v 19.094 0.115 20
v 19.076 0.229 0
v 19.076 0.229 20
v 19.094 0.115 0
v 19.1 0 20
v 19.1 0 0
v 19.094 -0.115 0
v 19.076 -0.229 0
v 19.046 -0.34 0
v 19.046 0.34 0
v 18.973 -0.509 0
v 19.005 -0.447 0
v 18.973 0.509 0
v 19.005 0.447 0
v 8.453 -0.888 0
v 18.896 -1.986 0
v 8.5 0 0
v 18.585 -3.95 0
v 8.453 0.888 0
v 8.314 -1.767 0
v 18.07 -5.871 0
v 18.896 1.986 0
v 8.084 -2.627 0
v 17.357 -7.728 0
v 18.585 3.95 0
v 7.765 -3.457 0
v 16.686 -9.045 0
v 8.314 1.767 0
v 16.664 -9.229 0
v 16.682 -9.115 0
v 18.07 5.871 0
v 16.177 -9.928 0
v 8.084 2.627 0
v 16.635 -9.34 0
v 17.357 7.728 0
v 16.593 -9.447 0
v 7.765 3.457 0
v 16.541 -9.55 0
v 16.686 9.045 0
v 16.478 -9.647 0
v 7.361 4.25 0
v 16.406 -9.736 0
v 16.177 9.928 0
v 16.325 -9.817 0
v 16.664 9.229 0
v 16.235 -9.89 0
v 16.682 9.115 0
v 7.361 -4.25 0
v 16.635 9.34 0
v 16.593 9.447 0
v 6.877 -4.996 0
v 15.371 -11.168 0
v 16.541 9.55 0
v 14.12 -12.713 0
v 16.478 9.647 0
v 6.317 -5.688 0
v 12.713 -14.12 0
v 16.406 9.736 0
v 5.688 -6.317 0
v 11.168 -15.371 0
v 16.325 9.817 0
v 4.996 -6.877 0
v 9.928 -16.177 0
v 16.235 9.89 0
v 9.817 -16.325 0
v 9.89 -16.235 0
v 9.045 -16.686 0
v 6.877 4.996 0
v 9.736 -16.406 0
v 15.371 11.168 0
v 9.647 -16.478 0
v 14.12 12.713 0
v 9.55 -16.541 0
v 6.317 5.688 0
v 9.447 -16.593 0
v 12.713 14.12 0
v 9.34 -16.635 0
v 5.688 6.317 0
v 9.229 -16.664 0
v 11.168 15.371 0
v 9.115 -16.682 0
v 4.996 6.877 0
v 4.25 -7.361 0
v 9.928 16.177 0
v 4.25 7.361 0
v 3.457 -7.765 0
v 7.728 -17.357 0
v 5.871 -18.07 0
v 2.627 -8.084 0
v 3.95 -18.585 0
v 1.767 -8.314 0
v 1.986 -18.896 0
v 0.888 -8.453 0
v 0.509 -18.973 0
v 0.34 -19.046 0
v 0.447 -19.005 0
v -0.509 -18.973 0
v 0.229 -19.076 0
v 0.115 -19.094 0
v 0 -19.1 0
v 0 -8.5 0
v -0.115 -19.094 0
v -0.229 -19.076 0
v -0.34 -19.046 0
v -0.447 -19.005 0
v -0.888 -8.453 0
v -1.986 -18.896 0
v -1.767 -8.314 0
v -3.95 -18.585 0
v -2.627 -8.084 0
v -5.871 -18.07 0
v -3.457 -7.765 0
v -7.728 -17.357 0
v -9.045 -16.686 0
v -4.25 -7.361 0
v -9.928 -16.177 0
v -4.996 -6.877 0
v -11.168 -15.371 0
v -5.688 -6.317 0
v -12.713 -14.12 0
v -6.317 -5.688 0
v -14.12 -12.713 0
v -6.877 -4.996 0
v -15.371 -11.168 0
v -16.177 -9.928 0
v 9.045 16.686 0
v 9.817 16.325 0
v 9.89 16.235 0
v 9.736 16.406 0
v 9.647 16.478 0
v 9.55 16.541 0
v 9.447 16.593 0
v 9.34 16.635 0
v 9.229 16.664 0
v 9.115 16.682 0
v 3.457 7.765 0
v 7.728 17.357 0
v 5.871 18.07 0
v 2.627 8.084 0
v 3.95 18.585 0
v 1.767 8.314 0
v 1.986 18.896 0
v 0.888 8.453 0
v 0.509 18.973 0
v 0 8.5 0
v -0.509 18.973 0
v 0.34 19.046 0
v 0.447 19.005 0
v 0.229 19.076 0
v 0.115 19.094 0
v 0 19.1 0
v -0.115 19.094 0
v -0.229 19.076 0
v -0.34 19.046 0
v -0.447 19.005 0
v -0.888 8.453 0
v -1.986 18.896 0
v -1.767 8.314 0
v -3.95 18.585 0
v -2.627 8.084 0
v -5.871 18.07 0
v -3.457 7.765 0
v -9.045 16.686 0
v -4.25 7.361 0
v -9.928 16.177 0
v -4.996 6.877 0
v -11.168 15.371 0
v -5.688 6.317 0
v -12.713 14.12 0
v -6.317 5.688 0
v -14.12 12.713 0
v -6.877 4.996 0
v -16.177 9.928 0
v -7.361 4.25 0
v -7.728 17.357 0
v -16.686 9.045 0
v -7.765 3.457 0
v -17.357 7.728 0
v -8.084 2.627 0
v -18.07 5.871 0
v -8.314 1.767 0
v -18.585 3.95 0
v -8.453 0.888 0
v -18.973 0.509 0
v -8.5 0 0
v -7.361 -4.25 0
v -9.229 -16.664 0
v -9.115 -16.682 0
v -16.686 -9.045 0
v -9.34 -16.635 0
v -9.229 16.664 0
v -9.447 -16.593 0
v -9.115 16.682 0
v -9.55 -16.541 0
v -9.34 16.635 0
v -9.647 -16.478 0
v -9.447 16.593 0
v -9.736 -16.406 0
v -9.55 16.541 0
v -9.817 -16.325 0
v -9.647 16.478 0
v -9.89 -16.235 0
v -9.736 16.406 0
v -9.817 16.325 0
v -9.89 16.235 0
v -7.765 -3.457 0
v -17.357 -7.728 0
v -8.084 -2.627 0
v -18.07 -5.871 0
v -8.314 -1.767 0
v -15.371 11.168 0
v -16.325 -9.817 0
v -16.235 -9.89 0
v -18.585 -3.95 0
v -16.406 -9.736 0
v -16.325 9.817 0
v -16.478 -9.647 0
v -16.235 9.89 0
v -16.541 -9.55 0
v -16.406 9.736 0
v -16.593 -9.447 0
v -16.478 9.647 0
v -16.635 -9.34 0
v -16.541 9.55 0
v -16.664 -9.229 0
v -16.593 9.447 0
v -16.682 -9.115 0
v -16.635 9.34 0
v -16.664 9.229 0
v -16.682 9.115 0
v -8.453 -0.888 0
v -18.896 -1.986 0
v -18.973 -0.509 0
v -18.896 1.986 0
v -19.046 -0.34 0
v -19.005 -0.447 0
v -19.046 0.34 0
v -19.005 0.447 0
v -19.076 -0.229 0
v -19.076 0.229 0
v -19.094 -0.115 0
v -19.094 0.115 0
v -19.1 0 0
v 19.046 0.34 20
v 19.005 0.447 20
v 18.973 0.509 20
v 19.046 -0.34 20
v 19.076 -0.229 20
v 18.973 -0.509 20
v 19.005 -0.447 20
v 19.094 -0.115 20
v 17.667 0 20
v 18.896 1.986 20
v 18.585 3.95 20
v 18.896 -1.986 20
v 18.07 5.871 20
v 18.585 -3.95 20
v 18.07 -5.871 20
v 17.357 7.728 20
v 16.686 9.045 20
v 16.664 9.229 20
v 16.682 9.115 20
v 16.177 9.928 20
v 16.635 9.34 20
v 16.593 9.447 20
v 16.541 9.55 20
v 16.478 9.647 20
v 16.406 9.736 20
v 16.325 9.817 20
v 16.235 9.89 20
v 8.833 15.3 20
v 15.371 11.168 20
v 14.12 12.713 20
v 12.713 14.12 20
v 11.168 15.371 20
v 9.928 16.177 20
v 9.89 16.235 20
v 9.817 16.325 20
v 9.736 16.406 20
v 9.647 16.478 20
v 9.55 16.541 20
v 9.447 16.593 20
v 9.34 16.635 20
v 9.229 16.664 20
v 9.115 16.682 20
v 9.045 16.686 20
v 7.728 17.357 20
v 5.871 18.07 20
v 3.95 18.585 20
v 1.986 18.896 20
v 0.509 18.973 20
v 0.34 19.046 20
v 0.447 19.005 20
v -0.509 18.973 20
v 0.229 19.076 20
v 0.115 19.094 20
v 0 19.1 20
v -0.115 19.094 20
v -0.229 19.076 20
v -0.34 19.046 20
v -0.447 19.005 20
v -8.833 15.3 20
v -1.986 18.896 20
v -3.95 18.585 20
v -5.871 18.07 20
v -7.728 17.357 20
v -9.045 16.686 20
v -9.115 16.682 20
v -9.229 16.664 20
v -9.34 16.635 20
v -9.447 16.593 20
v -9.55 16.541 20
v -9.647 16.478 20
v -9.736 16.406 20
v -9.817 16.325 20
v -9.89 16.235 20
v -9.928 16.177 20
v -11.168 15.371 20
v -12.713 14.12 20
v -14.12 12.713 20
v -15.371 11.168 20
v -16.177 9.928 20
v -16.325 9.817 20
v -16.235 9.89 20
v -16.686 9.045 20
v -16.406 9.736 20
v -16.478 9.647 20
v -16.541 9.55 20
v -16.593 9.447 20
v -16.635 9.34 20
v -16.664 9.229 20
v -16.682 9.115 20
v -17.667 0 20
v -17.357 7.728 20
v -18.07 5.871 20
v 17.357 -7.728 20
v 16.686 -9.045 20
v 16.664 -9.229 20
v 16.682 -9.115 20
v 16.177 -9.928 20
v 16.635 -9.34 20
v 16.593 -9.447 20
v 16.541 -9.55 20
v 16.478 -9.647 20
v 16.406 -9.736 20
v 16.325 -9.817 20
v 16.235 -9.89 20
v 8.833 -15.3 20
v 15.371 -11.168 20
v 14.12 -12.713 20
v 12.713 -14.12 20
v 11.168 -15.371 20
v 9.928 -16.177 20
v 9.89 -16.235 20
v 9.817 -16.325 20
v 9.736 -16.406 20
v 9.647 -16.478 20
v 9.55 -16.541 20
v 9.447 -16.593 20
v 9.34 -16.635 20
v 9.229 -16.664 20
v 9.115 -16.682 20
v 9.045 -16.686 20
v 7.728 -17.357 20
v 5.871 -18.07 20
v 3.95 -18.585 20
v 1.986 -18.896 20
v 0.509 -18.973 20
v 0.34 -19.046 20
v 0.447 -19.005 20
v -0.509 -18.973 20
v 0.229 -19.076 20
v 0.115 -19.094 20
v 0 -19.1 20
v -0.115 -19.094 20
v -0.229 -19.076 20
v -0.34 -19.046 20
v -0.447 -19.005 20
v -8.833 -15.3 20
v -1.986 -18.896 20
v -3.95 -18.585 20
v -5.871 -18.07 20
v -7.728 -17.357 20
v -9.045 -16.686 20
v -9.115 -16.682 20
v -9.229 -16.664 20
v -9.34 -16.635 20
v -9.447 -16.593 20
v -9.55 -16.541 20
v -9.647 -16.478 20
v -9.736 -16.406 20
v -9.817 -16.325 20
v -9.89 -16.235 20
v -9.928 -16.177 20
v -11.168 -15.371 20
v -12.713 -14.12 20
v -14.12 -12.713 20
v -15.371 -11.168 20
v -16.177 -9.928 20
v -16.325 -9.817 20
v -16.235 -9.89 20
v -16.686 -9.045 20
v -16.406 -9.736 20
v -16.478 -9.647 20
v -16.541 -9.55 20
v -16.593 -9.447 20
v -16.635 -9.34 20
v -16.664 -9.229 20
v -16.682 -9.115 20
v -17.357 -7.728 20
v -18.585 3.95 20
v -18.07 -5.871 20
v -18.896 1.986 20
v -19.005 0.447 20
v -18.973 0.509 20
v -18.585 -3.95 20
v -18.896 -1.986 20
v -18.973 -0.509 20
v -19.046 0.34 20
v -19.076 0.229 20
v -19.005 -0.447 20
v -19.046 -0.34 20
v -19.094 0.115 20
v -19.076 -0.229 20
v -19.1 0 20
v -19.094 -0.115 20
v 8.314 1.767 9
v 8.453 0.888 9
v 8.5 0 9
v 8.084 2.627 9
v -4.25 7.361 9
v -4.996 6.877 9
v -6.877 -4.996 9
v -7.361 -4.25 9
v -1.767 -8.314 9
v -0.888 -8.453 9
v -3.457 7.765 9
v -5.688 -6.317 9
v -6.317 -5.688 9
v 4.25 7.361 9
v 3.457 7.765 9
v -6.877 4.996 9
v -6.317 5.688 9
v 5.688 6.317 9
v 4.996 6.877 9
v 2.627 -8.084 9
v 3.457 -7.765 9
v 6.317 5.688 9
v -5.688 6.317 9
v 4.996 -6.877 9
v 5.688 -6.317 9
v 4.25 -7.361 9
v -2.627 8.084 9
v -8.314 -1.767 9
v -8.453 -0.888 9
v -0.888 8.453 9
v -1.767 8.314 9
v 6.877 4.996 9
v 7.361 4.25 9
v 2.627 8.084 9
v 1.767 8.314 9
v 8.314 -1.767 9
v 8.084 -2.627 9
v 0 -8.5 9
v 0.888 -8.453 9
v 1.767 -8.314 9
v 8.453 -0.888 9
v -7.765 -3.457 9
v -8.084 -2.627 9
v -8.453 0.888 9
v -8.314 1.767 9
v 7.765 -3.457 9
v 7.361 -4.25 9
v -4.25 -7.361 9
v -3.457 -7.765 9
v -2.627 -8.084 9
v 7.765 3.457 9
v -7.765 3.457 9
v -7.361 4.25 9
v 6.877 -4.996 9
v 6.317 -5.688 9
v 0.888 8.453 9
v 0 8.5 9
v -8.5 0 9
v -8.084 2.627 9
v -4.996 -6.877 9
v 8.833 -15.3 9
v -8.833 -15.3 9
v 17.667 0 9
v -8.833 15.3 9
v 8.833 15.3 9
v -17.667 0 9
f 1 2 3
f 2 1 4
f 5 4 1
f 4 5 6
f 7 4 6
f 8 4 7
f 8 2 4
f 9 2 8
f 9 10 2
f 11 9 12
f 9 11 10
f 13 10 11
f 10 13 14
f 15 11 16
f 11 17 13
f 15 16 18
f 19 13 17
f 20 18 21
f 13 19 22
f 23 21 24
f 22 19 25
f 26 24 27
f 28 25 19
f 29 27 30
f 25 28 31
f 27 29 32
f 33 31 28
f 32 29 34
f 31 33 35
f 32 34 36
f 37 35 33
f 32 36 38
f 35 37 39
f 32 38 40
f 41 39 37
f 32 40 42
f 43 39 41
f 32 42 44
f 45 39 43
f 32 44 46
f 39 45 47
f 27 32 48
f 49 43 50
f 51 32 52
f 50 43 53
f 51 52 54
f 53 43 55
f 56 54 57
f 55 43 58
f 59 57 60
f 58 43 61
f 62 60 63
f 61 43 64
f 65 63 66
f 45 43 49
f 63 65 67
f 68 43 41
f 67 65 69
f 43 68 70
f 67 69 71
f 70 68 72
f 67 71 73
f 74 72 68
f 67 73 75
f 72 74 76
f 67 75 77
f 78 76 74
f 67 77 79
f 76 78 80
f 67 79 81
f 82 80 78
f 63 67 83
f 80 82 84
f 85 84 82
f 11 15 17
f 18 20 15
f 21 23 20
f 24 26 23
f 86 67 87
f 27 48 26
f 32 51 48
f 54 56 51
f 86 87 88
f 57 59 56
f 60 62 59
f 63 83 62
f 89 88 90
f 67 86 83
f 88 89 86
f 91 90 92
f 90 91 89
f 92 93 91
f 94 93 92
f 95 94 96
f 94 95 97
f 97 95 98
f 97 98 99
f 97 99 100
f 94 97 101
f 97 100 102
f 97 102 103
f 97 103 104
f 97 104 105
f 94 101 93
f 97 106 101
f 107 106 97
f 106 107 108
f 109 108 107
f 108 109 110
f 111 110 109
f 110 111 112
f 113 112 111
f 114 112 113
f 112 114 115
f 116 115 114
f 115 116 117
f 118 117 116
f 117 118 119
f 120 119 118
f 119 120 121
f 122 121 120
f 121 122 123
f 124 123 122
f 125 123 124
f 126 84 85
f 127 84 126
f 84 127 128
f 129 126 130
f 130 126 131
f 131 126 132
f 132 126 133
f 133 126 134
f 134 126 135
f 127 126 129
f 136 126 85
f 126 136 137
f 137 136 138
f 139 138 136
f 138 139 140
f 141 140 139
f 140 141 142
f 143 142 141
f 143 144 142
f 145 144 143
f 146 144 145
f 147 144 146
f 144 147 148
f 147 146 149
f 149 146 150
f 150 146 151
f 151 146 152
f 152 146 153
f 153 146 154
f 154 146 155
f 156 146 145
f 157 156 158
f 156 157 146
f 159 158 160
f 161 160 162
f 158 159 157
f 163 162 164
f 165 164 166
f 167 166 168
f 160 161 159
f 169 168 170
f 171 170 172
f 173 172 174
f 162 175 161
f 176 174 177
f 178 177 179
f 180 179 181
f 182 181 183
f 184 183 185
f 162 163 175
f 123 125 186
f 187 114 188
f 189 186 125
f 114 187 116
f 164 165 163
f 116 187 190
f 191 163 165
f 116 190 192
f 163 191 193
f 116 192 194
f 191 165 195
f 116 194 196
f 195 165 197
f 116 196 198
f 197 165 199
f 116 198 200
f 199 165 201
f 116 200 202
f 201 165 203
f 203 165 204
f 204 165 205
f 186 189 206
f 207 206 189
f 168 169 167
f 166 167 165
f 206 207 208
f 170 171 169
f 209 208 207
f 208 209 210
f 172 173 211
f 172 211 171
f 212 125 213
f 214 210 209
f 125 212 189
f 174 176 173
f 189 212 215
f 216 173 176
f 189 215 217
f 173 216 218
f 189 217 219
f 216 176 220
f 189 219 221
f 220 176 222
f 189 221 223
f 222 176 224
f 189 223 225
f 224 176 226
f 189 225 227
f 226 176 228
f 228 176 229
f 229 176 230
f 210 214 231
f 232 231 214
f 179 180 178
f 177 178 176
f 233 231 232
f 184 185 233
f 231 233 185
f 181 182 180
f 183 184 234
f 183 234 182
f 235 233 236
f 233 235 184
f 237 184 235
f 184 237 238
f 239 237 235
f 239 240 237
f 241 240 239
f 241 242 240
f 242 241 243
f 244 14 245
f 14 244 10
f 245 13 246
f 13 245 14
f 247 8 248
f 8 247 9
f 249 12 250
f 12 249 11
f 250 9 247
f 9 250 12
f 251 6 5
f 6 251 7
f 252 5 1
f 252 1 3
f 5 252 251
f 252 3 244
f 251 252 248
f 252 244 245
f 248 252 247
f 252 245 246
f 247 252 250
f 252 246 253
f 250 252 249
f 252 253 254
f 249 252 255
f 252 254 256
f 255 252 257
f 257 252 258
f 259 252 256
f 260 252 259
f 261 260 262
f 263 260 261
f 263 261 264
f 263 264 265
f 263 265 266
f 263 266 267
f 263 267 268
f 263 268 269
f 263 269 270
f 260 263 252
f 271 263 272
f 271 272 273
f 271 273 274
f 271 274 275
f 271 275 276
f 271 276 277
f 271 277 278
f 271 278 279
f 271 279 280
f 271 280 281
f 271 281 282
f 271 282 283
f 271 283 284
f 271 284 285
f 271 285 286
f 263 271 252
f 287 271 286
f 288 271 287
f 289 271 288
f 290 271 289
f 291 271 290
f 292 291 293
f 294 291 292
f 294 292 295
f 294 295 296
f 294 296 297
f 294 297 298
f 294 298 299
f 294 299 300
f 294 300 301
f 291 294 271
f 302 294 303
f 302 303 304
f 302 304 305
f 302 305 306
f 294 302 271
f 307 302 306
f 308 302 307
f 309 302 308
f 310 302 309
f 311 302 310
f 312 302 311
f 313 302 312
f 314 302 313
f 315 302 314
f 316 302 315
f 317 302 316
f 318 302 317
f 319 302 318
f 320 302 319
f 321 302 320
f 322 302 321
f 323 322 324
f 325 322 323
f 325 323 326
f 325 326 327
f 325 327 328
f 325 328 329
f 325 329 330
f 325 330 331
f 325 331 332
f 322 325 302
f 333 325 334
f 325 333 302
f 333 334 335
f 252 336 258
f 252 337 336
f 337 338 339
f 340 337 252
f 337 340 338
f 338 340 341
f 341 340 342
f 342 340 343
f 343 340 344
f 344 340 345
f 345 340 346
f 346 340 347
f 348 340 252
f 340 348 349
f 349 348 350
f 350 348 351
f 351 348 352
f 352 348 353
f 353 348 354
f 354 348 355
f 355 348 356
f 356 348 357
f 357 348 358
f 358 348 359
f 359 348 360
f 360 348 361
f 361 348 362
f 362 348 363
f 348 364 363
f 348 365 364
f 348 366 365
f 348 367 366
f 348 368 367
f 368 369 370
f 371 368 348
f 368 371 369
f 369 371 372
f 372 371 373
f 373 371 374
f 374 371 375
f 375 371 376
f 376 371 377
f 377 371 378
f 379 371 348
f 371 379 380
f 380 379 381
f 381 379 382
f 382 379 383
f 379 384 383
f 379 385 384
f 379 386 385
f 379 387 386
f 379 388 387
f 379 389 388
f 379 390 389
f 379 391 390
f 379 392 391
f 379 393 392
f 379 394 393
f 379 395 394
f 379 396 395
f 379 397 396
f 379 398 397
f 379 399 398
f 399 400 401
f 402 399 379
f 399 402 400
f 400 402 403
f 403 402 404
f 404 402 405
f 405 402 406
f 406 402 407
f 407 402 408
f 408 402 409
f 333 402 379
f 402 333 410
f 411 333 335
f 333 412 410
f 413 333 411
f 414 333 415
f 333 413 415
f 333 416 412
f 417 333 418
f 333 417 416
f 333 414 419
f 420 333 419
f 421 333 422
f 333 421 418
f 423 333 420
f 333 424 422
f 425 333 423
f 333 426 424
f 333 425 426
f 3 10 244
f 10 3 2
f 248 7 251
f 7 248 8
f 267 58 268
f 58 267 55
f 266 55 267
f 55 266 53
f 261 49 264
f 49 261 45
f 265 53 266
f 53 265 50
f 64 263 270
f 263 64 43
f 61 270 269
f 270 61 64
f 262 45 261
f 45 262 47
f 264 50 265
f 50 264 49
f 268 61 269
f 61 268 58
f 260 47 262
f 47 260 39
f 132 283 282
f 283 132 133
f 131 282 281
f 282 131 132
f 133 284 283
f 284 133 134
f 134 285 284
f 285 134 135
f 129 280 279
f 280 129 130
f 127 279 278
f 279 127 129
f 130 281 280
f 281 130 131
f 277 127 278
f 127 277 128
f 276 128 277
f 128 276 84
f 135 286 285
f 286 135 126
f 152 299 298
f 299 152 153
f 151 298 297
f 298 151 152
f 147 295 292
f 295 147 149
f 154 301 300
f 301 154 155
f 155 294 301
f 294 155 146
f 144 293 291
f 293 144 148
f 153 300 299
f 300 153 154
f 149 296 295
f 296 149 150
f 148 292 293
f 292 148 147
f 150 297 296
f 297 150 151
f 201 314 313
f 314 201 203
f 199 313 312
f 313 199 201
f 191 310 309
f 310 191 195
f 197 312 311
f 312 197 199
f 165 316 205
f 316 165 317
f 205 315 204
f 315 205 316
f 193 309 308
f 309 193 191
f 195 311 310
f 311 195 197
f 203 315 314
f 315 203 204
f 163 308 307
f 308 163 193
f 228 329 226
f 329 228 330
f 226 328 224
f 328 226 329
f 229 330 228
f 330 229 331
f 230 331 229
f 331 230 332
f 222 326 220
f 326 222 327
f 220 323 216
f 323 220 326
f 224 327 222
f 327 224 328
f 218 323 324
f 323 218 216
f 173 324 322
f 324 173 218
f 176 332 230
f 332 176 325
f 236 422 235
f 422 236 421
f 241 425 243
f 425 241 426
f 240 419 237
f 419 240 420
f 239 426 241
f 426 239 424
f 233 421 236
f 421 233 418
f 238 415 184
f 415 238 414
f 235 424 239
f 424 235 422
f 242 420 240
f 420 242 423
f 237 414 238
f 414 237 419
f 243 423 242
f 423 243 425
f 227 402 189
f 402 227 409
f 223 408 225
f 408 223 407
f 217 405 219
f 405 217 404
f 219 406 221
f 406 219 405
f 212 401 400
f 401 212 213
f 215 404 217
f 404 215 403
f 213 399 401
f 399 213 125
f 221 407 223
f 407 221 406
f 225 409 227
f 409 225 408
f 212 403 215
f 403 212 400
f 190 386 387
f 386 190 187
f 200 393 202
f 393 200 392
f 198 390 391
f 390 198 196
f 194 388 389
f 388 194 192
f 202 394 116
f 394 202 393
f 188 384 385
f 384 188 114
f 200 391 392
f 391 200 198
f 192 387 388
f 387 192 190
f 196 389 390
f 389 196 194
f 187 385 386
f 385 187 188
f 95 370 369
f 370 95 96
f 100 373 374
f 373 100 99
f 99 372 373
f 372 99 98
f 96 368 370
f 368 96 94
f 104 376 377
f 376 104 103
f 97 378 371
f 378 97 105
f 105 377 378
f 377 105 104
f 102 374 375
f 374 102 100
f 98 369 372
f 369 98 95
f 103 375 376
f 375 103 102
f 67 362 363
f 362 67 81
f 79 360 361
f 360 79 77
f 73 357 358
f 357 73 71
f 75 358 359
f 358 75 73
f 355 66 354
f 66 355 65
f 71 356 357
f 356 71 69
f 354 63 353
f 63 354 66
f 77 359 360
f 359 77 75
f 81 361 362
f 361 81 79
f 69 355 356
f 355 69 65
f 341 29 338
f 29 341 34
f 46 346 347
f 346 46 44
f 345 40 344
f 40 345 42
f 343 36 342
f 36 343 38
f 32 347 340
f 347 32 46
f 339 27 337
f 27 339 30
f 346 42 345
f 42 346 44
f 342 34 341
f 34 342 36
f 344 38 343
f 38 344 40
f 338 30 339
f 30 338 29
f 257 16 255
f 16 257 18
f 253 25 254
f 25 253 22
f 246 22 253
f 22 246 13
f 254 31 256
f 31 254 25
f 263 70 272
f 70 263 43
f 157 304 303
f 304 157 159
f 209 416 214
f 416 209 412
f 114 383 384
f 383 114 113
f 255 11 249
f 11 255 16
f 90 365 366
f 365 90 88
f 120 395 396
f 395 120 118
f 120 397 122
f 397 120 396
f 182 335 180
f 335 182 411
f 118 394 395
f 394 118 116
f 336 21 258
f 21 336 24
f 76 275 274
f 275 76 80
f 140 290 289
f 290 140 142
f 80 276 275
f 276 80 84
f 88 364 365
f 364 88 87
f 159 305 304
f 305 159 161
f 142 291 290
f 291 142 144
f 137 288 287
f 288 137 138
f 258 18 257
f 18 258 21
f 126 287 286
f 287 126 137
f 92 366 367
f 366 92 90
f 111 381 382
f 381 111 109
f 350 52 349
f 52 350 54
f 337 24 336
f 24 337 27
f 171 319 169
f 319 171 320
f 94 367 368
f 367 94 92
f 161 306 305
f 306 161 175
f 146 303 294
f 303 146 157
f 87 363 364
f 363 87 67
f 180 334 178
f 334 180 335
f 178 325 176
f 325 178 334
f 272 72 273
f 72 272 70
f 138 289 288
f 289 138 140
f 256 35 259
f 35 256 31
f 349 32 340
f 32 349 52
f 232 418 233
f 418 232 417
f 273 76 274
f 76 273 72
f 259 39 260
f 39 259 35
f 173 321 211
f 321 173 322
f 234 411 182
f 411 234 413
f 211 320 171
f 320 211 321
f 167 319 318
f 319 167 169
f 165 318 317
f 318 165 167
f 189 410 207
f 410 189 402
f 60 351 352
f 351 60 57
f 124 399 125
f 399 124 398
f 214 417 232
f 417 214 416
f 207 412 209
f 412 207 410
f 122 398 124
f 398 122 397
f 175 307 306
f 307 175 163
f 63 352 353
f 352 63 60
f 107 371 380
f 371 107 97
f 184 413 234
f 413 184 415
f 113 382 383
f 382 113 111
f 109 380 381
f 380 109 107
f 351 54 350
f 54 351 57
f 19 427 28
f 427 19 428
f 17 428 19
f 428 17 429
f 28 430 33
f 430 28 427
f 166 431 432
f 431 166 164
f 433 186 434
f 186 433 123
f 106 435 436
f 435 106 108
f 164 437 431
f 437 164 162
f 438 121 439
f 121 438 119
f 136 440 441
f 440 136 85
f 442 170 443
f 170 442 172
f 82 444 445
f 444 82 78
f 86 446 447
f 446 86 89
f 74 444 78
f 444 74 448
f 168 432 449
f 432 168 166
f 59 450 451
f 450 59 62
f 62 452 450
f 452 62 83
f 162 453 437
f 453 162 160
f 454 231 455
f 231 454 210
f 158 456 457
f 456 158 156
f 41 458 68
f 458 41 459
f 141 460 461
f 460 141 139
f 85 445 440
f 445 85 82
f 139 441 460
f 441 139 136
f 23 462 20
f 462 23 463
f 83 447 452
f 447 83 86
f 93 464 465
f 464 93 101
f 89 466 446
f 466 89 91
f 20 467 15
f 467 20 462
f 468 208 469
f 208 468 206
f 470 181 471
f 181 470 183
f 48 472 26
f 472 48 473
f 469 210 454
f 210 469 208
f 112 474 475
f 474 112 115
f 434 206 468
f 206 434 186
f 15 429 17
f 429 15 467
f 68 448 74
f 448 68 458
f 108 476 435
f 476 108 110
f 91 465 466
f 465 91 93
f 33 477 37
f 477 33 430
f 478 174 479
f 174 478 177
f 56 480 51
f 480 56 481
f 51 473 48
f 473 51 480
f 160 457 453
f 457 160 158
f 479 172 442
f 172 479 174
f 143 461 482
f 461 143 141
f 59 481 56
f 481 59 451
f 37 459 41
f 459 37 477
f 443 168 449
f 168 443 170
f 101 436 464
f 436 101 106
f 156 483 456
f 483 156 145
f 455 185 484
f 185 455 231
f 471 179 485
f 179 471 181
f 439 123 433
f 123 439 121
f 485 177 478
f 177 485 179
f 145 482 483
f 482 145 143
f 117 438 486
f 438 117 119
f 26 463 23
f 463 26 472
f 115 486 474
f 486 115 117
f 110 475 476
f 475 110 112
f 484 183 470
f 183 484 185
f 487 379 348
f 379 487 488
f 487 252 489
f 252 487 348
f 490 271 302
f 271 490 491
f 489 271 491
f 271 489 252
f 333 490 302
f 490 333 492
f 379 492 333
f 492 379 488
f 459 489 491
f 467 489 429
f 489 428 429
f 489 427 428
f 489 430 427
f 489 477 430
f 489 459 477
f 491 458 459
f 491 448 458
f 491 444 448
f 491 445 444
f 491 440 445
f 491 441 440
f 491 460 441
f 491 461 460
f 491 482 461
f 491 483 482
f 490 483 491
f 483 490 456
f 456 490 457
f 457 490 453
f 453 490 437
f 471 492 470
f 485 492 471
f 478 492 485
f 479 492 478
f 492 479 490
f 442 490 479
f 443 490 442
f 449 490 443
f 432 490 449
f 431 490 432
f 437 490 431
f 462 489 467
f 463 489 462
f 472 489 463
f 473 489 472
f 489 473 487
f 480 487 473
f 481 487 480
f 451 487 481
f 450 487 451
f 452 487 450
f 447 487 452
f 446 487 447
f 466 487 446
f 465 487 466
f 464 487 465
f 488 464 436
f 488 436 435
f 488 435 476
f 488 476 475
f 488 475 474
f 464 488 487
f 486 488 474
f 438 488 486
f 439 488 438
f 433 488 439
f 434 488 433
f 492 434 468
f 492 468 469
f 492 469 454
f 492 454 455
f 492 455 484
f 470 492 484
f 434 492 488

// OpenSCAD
// Knurled-style thumb knob with hex socket.
$fn = 60;
eps = 0.02;
thread_d = 17;
knob_d = 38;
knob_h = 20;
socket_flat = thread_d * 1.8;
difference() {
    union() {
        cylinder(d = knob_d, h = knob_h);
        for (i = [0 : 11]) rotate([0, 0, i * 30]) translate([knob_d / 2 - 1, 0, 0]) cylinder(d = 2.2, h = knob_h);
    }
    translate([0, 0, -eps]) cylinder(d = thread_d, h = knob_h + 2 * eps);
    translate([0, 0, knob_h - knob_h * 0.55]) cylinder(d = socket_flat / cos(30), h = knob_h * 0.55 + eps, $fn = 6);
}
